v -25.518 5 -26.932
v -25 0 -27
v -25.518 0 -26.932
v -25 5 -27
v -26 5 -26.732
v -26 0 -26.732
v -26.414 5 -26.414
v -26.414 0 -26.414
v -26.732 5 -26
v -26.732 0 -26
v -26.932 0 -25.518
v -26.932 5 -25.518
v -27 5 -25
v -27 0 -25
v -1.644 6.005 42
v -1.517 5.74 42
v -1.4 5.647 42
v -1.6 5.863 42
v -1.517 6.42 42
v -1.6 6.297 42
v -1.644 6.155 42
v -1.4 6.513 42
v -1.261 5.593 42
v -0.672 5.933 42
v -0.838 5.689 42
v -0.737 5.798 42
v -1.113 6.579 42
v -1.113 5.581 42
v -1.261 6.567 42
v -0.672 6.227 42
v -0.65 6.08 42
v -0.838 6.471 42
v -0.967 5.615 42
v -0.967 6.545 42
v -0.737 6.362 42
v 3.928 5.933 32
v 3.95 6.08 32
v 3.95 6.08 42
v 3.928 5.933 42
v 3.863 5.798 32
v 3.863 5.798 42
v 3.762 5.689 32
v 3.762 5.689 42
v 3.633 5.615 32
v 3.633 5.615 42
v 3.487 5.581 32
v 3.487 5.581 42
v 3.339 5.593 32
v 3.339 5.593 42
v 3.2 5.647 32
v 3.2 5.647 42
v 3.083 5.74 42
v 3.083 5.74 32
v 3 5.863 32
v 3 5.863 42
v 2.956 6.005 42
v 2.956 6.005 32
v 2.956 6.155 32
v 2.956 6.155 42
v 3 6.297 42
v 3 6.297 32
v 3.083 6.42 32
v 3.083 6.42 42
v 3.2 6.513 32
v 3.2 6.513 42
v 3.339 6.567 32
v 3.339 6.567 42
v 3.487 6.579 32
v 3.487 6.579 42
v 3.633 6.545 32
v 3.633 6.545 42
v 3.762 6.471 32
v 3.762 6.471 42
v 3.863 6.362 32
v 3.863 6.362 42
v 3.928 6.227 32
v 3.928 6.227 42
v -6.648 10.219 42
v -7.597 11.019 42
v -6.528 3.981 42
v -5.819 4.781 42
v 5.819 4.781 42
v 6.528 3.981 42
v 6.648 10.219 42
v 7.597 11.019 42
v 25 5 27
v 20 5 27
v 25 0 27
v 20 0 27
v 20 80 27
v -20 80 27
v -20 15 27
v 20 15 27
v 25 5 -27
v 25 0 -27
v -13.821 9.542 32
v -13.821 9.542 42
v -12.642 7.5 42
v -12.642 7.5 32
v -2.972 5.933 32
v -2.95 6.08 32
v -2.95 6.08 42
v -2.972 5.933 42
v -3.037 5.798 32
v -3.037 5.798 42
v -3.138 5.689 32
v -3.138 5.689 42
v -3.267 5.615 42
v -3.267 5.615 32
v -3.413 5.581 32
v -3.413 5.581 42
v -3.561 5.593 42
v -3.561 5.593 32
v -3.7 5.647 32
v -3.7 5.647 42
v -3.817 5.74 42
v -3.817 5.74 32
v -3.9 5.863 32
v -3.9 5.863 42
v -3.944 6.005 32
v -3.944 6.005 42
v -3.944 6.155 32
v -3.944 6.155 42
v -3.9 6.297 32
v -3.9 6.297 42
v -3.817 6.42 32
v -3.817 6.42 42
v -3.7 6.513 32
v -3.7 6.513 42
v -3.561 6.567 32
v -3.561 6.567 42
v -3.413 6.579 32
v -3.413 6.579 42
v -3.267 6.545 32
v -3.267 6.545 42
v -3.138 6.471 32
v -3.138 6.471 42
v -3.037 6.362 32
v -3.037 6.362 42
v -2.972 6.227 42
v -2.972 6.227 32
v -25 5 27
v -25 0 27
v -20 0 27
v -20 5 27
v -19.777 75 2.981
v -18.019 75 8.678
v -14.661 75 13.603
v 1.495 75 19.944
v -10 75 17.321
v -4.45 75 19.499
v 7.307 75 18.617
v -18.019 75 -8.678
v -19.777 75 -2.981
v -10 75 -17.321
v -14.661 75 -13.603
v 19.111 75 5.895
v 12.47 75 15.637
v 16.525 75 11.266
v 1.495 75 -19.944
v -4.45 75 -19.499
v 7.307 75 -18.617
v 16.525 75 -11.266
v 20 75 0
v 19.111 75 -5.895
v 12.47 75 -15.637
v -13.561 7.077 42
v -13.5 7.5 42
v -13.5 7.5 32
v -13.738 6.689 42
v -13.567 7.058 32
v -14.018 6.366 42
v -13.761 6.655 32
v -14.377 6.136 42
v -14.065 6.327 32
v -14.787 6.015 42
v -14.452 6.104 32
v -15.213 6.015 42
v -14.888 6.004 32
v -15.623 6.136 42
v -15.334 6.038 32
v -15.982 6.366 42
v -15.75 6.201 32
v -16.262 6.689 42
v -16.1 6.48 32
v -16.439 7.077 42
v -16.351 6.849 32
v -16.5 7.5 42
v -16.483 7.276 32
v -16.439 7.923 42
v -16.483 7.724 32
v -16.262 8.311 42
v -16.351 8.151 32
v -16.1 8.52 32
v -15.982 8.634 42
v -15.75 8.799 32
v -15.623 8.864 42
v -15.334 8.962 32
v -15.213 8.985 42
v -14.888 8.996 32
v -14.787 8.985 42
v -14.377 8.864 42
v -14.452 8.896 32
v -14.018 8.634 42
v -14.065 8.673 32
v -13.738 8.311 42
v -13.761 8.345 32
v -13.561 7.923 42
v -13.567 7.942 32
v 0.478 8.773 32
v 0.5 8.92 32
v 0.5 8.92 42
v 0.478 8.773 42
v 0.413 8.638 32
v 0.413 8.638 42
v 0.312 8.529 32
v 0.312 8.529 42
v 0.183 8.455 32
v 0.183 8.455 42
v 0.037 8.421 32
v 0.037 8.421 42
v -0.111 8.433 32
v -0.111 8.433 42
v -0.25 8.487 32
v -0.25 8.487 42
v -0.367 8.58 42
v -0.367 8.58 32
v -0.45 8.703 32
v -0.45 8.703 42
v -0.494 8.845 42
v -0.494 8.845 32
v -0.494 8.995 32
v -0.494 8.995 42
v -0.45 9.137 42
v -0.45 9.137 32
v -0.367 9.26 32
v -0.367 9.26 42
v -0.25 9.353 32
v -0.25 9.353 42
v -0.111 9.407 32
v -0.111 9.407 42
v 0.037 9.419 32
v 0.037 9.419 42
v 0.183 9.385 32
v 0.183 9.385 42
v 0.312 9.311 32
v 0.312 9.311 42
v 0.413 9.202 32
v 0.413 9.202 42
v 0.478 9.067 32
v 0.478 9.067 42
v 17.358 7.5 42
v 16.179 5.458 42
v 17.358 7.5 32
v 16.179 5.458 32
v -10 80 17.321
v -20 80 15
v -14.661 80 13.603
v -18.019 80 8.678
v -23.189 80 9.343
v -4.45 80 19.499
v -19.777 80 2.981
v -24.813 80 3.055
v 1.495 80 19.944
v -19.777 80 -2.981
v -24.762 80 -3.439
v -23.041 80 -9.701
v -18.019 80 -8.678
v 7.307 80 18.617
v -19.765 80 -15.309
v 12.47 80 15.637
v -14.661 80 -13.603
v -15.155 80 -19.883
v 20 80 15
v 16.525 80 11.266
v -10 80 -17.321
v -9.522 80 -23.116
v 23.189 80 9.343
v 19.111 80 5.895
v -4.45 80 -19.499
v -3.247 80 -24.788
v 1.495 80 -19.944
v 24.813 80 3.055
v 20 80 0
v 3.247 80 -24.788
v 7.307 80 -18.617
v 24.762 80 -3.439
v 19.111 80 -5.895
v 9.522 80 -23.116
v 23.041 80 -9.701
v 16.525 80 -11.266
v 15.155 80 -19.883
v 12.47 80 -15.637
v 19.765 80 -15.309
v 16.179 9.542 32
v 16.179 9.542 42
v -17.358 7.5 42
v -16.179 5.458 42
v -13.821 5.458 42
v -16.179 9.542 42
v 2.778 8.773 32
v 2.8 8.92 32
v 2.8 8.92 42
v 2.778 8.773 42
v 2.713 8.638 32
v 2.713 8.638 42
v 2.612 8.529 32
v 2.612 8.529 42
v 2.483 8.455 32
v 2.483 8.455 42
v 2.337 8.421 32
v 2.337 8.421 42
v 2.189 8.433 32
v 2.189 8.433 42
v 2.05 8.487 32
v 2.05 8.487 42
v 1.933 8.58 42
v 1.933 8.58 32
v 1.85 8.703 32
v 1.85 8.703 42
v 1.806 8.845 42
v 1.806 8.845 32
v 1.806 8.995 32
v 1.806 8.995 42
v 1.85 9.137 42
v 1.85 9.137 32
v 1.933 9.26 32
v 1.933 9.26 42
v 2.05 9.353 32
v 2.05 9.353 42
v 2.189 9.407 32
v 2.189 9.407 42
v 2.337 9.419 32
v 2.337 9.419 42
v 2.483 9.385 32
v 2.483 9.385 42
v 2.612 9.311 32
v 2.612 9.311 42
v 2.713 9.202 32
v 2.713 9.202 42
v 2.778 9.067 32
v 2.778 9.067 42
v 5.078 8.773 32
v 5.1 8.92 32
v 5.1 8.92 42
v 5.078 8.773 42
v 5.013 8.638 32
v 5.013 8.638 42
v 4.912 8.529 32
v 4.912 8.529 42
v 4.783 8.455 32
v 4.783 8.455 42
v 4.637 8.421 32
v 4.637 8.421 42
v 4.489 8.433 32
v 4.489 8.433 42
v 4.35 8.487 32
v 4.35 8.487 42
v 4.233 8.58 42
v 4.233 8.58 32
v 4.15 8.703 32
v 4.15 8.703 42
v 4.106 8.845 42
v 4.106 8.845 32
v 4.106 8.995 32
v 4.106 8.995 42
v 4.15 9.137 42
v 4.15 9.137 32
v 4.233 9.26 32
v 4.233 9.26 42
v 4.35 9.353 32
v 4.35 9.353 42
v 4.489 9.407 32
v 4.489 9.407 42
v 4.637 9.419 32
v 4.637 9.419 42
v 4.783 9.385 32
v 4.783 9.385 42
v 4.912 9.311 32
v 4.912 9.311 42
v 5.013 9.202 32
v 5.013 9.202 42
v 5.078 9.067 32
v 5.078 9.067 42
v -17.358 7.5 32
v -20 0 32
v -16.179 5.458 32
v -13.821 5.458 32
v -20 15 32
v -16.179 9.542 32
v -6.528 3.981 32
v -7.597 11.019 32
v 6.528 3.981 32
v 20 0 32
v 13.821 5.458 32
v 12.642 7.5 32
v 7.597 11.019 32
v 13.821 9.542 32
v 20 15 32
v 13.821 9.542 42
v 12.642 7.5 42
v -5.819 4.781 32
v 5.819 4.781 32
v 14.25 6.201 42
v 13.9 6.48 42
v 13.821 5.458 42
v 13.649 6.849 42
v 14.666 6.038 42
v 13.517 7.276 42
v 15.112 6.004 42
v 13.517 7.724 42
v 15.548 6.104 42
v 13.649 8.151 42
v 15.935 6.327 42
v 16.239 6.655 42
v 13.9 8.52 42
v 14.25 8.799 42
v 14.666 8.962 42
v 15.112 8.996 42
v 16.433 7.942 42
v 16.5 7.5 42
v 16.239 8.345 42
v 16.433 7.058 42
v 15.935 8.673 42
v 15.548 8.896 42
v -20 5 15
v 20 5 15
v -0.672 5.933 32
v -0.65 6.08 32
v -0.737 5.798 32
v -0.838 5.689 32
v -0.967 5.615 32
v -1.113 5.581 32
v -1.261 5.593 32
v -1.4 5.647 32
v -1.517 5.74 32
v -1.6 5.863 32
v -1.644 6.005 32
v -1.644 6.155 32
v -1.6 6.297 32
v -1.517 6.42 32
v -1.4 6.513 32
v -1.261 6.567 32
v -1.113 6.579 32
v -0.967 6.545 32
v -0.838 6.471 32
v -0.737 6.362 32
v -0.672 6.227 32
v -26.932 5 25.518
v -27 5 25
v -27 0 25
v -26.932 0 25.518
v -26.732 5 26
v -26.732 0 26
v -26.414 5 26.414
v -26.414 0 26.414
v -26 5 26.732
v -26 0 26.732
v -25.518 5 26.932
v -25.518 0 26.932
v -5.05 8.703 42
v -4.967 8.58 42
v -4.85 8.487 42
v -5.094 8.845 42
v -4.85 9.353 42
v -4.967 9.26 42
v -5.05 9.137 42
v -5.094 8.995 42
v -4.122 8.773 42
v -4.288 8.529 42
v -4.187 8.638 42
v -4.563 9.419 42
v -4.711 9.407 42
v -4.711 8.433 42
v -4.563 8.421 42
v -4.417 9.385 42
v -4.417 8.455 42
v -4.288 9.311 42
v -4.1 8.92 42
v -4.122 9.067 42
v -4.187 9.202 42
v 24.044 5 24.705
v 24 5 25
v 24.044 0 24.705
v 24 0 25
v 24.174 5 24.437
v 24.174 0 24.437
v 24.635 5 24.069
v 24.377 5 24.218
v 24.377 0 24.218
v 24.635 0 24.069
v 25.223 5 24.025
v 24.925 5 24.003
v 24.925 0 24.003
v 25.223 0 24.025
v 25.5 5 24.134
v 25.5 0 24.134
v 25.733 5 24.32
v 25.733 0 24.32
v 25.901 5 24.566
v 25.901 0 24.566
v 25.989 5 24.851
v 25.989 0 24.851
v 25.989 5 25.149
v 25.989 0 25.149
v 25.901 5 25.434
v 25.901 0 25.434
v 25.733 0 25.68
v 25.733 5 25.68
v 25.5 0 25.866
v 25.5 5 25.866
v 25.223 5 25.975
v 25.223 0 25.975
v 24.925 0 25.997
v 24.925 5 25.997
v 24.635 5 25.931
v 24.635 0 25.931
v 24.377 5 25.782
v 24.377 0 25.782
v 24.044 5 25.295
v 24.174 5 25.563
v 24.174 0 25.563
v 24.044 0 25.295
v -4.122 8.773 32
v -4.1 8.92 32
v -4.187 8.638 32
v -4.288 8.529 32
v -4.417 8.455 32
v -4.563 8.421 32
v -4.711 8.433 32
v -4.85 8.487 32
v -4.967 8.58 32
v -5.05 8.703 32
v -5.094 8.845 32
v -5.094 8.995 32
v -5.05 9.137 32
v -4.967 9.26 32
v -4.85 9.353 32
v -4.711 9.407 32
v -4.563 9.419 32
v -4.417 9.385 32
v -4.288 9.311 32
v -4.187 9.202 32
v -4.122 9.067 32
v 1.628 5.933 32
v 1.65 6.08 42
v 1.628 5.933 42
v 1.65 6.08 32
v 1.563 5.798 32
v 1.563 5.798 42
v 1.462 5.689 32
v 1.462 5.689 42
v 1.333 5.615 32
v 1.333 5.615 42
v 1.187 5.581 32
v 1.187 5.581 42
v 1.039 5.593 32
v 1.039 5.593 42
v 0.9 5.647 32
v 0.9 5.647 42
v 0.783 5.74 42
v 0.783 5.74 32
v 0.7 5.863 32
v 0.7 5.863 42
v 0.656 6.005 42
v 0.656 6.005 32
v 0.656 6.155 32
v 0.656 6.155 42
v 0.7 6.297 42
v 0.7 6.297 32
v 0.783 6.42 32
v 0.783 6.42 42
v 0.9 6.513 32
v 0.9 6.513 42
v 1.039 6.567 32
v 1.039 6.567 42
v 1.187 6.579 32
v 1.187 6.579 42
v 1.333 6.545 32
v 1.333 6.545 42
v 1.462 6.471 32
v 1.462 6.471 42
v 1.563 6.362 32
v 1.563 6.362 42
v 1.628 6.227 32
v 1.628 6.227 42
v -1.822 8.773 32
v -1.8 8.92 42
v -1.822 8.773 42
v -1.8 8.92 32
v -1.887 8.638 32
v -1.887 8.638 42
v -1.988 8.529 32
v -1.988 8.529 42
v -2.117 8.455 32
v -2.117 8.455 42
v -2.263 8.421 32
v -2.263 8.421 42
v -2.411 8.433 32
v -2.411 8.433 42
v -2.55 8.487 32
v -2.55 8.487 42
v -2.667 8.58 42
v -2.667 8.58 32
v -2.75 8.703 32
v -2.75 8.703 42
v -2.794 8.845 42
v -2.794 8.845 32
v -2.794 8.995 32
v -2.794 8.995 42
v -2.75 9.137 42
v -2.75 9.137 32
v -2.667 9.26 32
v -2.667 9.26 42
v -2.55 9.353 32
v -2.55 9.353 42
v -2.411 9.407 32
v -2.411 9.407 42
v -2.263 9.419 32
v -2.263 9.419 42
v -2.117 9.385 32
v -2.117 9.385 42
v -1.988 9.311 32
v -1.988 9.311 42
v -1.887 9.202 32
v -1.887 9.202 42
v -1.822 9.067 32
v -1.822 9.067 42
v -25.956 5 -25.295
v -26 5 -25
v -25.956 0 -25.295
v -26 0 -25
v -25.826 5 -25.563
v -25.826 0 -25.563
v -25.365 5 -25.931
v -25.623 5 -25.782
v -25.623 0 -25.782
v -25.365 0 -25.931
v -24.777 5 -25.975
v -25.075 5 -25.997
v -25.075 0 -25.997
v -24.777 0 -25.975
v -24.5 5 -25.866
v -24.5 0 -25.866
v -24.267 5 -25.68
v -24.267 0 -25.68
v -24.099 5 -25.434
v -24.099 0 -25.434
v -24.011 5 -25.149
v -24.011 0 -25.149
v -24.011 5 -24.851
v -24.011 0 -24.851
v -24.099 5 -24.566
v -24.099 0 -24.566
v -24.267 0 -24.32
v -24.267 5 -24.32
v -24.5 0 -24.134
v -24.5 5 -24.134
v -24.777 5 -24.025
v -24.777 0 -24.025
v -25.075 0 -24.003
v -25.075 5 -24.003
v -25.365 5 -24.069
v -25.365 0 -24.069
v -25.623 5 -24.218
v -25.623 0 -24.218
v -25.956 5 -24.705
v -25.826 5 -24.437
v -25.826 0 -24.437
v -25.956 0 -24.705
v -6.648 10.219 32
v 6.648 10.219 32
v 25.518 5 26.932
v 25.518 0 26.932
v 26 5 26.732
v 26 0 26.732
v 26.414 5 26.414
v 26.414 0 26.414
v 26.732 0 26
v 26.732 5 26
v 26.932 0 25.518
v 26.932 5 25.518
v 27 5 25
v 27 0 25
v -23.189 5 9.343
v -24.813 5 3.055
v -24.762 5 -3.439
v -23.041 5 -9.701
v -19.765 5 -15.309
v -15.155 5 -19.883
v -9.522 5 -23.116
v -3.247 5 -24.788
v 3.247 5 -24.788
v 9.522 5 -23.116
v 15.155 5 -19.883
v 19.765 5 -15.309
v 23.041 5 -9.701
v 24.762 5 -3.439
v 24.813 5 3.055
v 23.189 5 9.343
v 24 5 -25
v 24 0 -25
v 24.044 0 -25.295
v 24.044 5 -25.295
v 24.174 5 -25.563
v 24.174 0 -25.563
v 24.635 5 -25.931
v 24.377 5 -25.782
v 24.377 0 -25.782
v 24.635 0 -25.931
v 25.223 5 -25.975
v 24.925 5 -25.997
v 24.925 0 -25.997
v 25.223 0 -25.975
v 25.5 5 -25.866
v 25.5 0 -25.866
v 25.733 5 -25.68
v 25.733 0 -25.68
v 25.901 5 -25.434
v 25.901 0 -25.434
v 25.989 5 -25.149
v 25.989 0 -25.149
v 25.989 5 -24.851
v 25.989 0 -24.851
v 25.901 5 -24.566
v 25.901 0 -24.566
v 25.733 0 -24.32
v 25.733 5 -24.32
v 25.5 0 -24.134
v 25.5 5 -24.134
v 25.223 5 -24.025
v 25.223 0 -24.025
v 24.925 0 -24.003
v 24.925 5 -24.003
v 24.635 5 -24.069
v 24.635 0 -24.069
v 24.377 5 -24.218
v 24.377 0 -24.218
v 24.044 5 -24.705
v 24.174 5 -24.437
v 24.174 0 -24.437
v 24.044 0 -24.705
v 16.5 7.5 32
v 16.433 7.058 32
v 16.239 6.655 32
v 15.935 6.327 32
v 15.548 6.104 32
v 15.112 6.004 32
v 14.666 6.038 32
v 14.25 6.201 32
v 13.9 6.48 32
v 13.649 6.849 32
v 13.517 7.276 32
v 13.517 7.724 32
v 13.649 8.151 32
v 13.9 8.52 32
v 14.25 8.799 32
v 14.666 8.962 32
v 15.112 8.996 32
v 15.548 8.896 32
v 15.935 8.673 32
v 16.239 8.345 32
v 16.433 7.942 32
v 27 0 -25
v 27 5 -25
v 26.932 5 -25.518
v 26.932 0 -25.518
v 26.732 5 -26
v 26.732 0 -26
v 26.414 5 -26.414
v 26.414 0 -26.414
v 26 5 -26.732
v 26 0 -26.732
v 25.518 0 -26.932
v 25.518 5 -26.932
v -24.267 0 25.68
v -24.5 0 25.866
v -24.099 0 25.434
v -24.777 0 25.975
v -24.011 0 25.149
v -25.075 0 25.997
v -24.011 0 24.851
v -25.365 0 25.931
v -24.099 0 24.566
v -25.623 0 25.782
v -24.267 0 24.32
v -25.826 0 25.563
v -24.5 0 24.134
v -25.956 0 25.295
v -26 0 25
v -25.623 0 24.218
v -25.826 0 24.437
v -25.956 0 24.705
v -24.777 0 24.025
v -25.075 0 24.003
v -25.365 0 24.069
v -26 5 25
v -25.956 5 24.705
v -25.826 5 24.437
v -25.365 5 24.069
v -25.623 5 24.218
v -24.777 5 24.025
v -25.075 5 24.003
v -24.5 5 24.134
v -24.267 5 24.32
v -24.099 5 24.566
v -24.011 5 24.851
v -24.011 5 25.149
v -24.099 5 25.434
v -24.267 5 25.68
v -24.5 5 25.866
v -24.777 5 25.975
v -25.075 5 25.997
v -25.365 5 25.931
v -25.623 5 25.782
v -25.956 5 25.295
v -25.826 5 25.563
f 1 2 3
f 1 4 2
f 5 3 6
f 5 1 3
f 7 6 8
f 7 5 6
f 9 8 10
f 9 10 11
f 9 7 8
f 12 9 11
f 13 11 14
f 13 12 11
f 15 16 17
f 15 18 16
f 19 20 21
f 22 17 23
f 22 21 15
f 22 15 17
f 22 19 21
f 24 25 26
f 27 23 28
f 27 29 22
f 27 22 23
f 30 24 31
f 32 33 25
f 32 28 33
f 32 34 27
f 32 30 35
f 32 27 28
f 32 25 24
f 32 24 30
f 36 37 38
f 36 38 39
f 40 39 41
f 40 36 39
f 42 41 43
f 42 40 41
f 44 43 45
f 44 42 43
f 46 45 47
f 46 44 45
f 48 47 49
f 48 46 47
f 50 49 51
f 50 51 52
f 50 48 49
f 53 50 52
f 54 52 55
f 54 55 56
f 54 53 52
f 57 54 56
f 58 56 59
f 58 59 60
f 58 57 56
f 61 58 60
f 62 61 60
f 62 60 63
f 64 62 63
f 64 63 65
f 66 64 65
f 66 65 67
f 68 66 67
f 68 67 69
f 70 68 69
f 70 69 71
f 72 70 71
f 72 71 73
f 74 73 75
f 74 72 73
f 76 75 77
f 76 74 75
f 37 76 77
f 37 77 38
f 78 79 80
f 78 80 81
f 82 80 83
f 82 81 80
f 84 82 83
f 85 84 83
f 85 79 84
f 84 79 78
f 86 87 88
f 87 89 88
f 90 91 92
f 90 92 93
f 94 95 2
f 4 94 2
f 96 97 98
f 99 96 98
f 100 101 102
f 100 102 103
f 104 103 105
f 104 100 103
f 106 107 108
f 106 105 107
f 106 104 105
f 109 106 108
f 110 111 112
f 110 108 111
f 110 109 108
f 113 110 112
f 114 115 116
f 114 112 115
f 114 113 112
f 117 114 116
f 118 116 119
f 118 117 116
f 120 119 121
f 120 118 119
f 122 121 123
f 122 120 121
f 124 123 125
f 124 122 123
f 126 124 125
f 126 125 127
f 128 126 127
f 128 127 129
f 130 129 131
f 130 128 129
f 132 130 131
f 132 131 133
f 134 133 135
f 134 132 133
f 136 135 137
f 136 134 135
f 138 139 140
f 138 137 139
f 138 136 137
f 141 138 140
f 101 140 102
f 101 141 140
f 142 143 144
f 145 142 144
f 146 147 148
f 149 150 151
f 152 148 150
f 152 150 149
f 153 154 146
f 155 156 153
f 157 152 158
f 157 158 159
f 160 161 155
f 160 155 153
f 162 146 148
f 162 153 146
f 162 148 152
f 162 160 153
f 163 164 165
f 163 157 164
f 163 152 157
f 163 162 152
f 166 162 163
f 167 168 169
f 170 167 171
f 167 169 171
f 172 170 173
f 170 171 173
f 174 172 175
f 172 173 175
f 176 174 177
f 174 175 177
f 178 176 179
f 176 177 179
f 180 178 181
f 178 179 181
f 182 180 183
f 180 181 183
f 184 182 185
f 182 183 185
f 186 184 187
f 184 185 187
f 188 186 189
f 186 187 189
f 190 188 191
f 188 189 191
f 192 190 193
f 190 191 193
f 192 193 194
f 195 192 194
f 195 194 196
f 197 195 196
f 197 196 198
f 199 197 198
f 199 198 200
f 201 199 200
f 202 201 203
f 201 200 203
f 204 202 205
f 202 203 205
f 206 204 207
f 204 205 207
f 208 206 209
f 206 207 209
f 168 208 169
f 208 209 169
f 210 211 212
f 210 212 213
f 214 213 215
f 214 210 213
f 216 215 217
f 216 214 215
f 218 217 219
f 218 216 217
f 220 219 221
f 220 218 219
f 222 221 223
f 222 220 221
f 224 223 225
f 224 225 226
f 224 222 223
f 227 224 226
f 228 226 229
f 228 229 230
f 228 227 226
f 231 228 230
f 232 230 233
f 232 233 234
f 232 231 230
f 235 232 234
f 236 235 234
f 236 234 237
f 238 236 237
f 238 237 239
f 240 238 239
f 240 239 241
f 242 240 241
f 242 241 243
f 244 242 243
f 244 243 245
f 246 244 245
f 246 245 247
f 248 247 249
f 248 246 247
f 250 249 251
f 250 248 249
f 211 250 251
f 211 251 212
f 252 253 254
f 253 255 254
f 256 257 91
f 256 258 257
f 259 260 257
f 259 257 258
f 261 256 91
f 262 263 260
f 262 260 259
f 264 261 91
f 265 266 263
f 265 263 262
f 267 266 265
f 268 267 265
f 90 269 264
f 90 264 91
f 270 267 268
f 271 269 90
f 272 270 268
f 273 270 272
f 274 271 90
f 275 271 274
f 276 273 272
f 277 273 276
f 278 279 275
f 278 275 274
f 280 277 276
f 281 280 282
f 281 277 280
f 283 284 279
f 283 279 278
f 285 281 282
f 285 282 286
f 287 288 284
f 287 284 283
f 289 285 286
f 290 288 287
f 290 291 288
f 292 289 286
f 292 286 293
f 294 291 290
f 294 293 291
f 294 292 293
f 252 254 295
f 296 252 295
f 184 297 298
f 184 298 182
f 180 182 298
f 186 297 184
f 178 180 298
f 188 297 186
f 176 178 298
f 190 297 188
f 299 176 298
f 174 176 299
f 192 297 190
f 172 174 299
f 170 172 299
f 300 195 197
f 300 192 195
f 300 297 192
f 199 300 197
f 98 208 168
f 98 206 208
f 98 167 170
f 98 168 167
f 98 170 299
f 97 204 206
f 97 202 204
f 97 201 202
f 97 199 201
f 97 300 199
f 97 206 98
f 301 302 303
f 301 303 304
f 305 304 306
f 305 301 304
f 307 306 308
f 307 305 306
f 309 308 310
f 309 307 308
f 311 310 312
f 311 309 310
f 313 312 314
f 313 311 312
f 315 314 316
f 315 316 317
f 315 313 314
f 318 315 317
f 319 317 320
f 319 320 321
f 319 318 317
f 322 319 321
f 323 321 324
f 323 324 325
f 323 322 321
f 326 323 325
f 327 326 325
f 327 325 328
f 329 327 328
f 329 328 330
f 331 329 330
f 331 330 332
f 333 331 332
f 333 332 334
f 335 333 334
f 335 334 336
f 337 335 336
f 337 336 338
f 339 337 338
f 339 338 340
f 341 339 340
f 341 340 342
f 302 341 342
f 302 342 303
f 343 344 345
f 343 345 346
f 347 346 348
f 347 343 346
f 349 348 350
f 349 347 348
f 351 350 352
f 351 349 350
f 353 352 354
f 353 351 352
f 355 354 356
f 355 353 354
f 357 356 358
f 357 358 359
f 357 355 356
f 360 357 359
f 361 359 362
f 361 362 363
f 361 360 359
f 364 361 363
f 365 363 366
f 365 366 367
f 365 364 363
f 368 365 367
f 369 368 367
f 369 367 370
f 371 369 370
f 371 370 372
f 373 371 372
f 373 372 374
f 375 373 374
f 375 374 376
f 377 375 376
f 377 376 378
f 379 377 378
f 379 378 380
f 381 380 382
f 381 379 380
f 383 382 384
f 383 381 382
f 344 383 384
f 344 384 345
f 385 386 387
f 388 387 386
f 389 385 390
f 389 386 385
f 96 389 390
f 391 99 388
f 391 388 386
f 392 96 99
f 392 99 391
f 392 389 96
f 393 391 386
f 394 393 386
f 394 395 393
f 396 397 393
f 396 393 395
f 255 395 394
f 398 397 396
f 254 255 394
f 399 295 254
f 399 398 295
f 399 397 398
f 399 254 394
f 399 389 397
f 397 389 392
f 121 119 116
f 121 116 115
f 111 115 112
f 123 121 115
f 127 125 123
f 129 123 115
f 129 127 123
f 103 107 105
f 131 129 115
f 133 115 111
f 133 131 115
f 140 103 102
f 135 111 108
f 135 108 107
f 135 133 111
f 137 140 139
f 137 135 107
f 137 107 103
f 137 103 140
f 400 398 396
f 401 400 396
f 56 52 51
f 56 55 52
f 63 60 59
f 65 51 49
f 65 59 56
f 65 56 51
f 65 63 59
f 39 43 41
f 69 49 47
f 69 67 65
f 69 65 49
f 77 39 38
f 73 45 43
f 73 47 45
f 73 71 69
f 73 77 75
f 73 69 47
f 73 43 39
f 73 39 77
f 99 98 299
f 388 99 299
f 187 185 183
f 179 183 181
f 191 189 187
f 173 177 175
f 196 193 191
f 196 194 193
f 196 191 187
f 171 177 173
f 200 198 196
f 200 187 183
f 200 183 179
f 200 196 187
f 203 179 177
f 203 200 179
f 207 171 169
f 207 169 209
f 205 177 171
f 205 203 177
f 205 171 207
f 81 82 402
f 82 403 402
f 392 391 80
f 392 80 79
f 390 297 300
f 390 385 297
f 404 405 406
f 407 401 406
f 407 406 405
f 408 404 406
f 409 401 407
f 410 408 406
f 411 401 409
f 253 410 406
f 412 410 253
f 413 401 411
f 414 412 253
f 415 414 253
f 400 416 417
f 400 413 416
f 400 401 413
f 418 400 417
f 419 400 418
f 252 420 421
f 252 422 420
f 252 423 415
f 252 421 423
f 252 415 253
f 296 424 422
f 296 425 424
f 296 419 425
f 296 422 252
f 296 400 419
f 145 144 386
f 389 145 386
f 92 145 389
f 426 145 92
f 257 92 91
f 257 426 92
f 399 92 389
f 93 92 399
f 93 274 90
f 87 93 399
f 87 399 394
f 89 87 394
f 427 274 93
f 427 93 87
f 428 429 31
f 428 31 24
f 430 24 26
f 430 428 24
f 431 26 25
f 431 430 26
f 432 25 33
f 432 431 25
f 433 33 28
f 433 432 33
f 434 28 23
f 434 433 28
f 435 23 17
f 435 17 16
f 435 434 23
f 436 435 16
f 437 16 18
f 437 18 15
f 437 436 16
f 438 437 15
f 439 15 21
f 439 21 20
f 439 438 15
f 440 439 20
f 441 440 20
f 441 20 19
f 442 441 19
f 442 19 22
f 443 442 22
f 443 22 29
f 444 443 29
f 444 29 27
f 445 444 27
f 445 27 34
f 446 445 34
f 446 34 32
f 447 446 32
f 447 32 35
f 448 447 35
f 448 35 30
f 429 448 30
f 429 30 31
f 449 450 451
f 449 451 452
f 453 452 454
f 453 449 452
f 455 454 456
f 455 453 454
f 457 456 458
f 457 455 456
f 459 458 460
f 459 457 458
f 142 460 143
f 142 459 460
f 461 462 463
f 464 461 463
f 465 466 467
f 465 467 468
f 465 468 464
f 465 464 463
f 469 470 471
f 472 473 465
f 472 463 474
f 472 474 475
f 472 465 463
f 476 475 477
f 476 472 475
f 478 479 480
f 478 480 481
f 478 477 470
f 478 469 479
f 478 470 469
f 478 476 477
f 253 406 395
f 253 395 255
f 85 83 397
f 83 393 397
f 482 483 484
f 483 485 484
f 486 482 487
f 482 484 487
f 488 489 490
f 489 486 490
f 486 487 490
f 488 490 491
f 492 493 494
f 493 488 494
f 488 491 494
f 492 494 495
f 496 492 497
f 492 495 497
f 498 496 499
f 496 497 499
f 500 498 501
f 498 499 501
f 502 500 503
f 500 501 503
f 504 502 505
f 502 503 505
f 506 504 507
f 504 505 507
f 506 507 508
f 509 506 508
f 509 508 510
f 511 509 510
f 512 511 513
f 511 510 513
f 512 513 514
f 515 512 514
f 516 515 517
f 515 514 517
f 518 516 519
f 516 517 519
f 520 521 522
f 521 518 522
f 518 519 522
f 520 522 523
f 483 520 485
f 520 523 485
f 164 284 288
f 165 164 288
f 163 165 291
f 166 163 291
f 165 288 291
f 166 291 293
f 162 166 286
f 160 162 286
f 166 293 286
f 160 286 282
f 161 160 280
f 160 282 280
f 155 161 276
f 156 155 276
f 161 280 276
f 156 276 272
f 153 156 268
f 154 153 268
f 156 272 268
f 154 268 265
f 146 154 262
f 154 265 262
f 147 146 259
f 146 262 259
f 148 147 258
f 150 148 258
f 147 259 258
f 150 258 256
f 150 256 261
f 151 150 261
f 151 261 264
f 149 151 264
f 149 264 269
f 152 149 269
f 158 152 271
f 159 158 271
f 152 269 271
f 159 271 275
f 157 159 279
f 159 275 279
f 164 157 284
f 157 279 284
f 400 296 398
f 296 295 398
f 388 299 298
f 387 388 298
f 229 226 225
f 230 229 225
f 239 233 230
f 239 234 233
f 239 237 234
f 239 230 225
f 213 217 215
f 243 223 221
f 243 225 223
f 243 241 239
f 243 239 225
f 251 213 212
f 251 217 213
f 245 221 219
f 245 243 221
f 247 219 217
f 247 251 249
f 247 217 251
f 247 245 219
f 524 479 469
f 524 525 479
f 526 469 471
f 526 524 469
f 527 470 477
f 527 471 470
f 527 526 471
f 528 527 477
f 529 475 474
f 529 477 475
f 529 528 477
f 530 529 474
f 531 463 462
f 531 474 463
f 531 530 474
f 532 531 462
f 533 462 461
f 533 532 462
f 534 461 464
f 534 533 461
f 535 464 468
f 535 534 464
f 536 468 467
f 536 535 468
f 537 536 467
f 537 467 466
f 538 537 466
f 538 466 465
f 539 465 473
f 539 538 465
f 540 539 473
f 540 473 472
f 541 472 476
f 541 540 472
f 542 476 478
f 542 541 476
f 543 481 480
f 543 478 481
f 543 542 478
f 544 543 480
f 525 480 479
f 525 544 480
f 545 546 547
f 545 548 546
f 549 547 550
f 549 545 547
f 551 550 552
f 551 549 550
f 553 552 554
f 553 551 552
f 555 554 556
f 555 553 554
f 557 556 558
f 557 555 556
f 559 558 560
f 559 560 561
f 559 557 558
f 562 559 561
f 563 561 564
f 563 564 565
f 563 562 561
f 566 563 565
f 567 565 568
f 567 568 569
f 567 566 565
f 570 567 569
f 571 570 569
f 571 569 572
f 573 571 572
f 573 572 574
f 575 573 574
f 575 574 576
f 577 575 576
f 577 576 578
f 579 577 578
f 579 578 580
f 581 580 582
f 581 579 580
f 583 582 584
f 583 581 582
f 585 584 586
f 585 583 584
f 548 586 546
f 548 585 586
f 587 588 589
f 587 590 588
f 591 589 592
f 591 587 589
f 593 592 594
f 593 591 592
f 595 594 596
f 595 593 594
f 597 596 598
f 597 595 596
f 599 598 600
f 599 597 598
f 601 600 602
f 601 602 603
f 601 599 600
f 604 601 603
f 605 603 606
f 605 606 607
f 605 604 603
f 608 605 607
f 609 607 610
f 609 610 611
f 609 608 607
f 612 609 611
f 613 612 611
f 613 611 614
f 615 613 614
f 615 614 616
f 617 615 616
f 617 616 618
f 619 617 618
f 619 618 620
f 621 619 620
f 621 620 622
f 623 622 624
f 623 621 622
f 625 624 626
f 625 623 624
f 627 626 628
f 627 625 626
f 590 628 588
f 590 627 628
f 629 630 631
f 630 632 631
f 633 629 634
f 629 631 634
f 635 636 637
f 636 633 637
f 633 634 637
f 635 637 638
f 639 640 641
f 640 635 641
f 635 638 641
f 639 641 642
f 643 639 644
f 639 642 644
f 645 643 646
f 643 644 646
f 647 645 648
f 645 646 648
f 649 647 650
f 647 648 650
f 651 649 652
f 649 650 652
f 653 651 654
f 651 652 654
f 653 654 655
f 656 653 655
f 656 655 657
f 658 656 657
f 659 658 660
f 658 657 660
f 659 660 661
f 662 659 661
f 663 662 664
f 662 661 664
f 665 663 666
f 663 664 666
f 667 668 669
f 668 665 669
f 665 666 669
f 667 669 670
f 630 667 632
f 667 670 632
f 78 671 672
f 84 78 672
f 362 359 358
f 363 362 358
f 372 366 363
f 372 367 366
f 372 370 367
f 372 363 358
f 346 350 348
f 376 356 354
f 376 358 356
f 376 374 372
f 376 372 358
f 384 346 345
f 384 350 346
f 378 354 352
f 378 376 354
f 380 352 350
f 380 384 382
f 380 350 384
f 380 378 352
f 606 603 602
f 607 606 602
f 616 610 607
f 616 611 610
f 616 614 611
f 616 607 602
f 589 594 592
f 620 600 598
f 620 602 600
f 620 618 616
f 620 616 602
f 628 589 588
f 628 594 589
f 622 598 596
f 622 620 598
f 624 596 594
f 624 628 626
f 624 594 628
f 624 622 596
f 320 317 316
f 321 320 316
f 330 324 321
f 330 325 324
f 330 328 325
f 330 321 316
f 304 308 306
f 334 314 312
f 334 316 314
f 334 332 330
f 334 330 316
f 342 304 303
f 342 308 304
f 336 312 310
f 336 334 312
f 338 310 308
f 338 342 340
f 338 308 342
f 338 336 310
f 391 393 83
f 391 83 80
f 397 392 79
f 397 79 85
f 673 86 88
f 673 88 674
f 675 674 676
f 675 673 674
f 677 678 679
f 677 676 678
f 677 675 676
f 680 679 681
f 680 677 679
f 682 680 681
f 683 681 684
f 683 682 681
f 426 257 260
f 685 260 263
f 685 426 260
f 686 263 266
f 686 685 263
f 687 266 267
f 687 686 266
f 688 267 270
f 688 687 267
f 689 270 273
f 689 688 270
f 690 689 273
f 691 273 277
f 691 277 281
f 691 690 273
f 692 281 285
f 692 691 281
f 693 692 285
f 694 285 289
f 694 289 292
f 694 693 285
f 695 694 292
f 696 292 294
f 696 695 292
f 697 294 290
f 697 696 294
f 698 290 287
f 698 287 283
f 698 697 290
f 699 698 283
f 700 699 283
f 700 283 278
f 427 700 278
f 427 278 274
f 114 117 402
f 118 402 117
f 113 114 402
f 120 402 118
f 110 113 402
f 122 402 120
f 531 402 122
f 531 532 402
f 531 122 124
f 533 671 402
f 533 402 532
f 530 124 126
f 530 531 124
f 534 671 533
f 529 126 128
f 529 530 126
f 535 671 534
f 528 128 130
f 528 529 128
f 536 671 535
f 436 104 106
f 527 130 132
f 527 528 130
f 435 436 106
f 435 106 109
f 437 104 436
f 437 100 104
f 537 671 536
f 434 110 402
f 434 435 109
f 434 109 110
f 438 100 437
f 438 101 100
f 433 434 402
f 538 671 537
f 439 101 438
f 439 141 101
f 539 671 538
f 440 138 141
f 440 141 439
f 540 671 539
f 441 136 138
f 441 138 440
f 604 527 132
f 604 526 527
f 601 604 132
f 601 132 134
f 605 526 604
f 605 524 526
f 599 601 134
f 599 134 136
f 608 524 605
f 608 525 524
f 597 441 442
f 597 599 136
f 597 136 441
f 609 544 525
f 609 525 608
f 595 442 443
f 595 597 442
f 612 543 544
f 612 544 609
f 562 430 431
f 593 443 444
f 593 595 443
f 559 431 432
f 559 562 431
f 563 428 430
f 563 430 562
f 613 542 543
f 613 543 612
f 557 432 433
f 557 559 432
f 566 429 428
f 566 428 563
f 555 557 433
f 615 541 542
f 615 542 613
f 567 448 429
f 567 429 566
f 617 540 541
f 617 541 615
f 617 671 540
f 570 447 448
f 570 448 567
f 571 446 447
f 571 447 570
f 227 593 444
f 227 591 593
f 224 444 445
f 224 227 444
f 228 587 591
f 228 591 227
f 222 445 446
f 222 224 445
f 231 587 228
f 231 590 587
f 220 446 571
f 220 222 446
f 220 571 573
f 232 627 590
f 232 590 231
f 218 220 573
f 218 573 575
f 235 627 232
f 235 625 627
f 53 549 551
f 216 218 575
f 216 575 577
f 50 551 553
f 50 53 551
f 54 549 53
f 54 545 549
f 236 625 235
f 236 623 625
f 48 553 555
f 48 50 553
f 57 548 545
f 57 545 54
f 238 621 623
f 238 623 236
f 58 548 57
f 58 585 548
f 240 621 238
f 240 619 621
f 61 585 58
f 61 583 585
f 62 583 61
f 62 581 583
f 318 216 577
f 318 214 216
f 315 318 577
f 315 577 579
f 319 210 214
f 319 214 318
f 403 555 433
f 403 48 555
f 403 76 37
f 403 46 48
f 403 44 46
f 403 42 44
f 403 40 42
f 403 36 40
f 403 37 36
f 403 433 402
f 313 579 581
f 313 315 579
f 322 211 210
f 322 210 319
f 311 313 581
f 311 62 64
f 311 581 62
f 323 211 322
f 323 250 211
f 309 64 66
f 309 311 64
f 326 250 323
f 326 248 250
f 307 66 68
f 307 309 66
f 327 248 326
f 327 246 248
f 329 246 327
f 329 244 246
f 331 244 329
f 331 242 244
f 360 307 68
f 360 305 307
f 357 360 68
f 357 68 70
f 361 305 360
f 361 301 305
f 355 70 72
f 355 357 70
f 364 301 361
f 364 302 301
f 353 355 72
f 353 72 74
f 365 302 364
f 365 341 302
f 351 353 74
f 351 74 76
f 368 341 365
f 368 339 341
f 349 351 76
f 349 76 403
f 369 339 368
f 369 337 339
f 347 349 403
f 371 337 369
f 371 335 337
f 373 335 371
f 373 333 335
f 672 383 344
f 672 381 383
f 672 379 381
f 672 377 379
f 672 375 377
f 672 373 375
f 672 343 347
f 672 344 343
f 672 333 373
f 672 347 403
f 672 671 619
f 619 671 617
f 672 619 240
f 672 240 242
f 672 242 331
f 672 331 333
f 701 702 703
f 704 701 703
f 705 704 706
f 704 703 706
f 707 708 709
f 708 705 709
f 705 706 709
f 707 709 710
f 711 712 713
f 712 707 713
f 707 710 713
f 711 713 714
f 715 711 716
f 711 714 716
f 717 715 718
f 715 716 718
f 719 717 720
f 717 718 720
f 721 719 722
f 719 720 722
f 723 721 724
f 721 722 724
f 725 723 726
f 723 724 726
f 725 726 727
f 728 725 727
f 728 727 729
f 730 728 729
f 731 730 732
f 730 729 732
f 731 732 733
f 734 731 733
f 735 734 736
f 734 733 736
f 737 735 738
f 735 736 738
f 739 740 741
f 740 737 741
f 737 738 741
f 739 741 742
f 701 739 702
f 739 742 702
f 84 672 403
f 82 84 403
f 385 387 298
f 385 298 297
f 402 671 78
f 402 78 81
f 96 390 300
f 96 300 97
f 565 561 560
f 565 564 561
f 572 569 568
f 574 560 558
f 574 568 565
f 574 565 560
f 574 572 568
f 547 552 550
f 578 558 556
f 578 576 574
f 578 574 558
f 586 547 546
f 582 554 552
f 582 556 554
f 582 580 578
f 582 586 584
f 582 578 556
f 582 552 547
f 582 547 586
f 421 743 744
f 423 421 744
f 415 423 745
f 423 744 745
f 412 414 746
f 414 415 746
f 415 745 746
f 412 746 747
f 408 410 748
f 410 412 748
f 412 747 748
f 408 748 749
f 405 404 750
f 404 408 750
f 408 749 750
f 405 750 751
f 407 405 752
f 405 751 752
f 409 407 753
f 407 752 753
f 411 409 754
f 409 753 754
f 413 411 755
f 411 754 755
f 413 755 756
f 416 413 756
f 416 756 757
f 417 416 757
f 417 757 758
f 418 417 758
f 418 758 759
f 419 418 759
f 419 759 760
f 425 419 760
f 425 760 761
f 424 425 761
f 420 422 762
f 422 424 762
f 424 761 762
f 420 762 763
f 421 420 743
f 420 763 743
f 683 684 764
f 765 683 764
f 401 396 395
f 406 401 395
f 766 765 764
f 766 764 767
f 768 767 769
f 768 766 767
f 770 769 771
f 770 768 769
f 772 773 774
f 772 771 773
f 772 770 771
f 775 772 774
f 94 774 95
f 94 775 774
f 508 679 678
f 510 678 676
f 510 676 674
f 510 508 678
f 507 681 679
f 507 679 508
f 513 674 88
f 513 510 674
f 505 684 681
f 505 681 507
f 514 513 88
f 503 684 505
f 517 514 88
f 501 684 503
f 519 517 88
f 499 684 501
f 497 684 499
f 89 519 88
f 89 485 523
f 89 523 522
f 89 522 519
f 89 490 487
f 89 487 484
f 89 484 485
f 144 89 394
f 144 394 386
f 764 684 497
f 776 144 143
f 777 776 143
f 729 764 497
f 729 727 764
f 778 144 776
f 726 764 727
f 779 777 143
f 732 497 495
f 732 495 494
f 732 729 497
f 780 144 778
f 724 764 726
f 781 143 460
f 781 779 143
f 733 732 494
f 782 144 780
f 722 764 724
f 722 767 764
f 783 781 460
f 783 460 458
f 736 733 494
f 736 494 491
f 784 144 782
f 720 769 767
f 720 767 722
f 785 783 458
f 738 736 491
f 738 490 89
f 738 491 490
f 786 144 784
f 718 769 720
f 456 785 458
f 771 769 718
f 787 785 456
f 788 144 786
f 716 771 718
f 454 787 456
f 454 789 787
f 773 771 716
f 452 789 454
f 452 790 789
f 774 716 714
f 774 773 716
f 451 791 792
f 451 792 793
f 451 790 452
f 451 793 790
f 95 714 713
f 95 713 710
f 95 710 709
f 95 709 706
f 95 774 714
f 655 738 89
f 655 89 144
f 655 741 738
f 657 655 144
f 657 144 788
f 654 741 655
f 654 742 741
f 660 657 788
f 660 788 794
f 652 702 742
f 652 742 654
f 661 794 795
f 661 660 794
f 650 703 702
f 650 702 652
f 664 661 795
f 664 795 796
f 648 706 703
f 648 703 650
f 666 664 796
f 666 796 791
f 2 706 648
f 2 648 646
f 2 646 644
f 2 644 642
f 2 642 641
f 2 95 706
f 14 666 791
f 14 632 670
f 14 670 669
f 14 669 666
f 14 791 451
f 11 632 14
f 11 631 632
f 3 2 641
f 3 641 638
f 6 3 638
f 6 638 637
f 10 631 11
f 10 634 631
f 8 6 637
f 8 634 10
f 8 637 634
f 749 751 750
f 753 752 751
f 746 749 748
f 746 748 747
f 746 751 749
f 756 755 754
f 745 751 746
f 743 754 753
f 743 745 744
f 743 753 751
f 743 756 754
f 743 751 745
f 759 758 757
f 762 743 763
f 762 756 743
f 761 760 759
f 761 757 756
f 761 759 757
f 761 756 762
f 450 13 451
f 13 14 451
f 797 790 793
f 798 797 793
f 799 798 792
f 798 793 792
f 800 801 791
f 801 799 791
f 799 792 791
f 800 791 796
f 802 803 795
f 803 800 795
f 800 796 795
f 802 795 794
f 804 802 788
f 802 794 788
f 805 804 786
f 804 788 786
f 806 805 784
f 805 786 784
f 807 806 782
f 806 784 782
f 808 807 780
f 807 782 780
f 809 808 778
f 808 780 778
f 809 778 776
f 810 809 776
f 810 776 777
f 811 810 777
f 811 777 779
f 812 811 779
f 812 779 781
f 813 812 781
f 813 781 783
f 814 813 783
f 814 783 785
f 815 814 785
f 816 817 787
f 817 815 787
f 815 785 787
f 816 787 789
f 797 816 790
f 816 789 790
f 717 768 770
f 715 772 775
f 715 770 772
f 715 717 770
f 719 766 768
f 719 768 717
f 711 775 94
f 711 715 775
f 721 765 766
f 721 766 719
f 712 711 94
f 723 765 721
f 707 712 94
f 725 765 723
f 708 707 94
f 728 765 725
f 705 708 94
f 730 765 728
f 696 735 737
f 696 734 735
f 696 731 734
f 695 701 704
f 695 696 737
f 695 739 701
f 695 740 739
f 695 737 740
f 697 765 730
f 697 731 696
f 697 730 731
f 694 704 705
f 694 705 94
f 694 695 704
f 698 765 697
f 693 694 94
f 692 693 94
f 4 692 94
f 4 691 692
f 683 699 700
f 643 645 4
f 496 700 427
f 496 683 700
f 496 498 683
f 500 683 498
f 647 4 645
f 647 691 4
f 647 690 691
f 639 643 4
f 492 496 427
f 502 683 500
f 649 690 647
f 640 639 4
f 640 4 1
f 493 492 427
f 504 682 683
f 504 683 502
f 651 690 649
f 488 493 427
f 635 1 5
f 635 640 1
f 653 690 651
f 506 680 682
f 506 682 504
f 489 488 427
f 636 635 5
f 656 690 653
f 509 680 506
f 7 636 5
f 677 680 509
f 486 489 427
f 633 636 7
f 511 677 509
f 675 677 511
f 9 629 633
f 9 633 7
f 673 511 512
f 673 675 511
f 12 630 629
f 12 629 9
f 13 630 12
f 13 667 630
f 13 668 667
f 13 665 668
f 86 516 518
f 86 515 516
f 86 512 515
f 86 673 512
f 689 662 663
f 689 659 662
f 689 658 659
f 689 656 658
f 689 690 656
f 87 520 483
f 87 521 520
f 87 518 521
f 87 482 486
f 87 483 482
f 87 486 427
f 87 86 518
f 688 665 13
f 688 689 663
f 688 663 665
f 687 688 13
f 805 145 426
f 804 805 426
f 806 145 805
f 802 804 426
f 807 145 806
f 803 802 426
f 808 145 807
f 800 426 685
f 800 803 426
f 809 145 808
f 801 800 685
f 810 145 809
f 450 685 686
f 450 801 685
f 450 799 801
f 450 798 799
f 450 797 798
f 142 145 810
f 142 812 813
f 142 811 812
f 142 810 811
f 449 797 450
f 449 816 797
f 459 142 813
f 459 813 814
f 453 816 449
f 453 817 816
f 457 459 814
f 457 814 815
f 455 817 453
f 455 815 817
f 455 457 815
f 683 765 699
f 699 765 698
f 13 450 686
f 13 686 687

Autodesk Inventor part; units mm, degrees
sketch "Sketch1" plane through (0, 0, 0) normal (0, 1, 0) x (-1, 0, 0)
  line L0 (27, 27) -> (-27, 27)
  line L1 (-27, 27) -> (-27, -27)
  line L2 (-27, -27) -> (27, -27)
  line L3 (27, -27) -> (27, 27)
  line L4 (27, 27) -> (-27, -27) construction
  line L5 (-27, 27) -> (27, -27) construction
  circle A0 centre (25, 25) radius 1
  circle A1 centre (25, -25) radius 1
  circle A2 centre (-25, -25) radius 1
  circle A3 centre (-25, 25) radius 1
  point P0 (0, 0)
  dimension "d0" = 54
  dimension "d1" = 54
  dimension "d2" = 2
  dimension "d3" = 2
  dimension "d4" = 2
  dimension "d5" = 2
extrude "Extrusion1" add sketch "Sketch1" along normal blind 5
fillet "Fillet1" radius 2 1 edges at (27, 2.5, -27)
fillet "Fillet2" radius 2 3 edges at (-27, 2.5, -27) (-27, 2.5, 27) (27, 2.5, 27)
ref_plane "Work Plane1" through (0, 5, 0) normal (0, 1, 0) x (1, 0, 0)
sketch "Sketch3" plane through (0, 5, 0) normal (0, 1, 0) x (1, 0, 0)
  circle A0 centre (0, 0) radius 25
  line L0 (-25, -27) -> (25, -27) projected
  line L1 (0, -27) -> (20, -27)
  line L2 (20, -27) -> (20, -15)
  line L3 (0, -27) -> (-20, -27)
  line L4 (-20, -27) -> (-20, -15)
  dimension "d11" = 50
  dimension "d12" = 20
  dimension "d13" = 20
extrude "Extrusion2" add sketch "Sketch3" along normal blind 75
ref_plane "Work Plane2" through (0, 80, 0) normal (0, 1, 0) x (1, 0, 0)
sketch "Sketch4" plane through (0, 80, 0) normal (0, 1, 0) x (1, 0, 0)
  circle A0 centre (0, 0) radius 20
  dimension "d17" = 40
extrude "Extrusion3" cut sketch "Sketch4" against normal blind 5
ref_plane "Work Plane3" through (-25, 0, 27) normal (0, 0, 1) x (1, 0, 0)
sketch "Sketch5" plane through (-25, 0, 27) normal (0, 0, 1) x (1, 0, 0)
  line L0 (25, 0) -> (25, 7.5)
  line L1 (5, 15) -> (45, 15)
  line L2 (45, 15) -> (45, 0)
  line L3 (45, 0) -> (5, 0)
  line L4 (5, 0) -> (5, 15)
  line L5 (5, 15) -> (45, 0) construction
  line L6 (45, 15) -> (5, 0) construction
  dimension "d21" = 7.5
  dimension "d22" = 40
  dimension "d23" = 15
extrude "Extrusion4" add sketch "Sketch5" along normal blind 5
ref_plane "Work Plane4" through (-25, 0, 32) normal (0, 0, 1) x (1, 0, 0)
sketch "Sketch6" plane through (-25, 0, 32) normal (0, 0, 1) x (1, 0, 0)
  line L0 (25, 7.5) -> (25, 8.92)
  circle A0 centre (25, 8.92) radius 0.5
  line L1 (25, 8.92) -> (27.3, 8.92)
  line L2 (27.3, 8.92) -> (29.6, 8.92)
  line L3 (25, 8.92) -> (22.7, 8.92)
  line L4 (22.7, 8.92) -> (20.4, 8.92)
  circle A1 centre (20.4, 8.92) radius 0.5
  circle A2 centre (27.3, 8.92) radius 0.5
  circle A3 centre (22.7, 8.92) radius 0.5
  circle A4 centre (29.6, 8.92) radius 0.5
  line L5 (25, 7.5) -> (25, 6.08)
  line L6 (26.15, 6.08) -> (25, 6.08)
  line L7 (23.85, 6.08) -> (25, 6.08)
  circle A5 centre (26.15, 6.08) radius 0.5
  circle A6 centre (23.85, 6.08) radius 0.5
  line L8 (23.85, 6.08) -> (21.55, 6.08)
  line L9 (26.15, 6.08) -> (28.45, 6.08)
  circle A7 centre (28.45, 6.08) radius 0.5
  circle A8 centre (21.55, 6.08) radius 0.5
  line L10 (18.3522, 10.2186) -> (31.6478, 10.2186)
  line L11 (30.8187, 4.7814) -> (19.1813, 4.7814)
  line L12 (31.6478, 10.2186) -> (30.8187, 4.7814)
  line L13 (18.3522, 10.2186) -> (19.1813, 4.7814)
  line L14 (25, 10.2186) -> (25, 11.0186)
  line L15 (25, 4.7814) -> (25, 3.9814)
  line L16 (25, 3.9814) -> (31.5285, 3.9814)
  line L17 (31.5285, 3.9814) -> (32.5973, 11.0186)
  line L18 (32.5973, 11.0186) -> (25, 11.0186)
  line L19 (25, 3.9814) -> (18.4715, 3.9814)
  line L20 (18.4715, 3.9814) -> (17.4027, 11.0186)
  line L21 (17.4027, 11.0186) -> (25, 11.0186)
  point P0 (25, 0)
  dimension "d30" = 1
  dimension "d33" = 1
  dimension "d34" = 1
  dimension "d35" = 1
  dimension "d36" = 1
  dimension "d38" = 1
  dimension "d39" = 1
  dimension "d40" = 1
  dimension "d41" = 1
  dimension "d44" = 0.8
extrude "Extrusion5" add sketch "Sketch6" along normal blind 10 contours A1 | A3 L4 L3 | L3 L4 A3 | A4 | A2 L2 L1 | L1 L2 A2 | A0 L3 L0 | L0 L1 A0 | A7 | A5 L9 L6 | L6 L9 A5 | A8 | A6 L8 L7 | L7 L8 A6 | L3 A0 L1 | L13 L11 L15 L19 L20 L21 L14 L10 | L14 L18 L17 L16 L15 L11 L12 L10
sketch "Sketch7" plane through (-25, 0, 32) normal (0, 0, 1) x (1, 0, 0)
  line L0 (5, 15) -> (5, 0) projected
  line L1 (5, 7.5) -> (10, 7.5)
  circle A0 centre (10, 7.5) radius 1.5
  line L2 (12.3579, 7.5) -> (11.1789, 5.458)
  line L3 (11.1789, 5.458) -> (8.8211, 5.458)
  line L4 (8.8211, 5.458) -> (7.6421, 7.5)
  line L5 (7.6421, 7.5) -> (8.8211, 9.542)
  line L6 (8.8211, 9.542) -> (11.1789, 9.542)
  line L7 (11.1789, 9.542) -> (12.3579, 7.5)
  line L8 (25, 0) -> (25, 2.1902)
  circle A1 centre (40, 7.5) radius 1.5
  line L9 (37.6421, 7.5) -> (38.8211, 5.458)
  line L10 (38.8211, 5.458) -> (41.1789, 5.458)
  line L11 (41.1789, 5.458) -> (42.3579, 7.5)
  line L12 (42.3579, 7.5) -> (41.1789, 9.542)
  line L13 (41.1789, 9.542) -> (38.8211, 9.542)
  line L14 (38.8211, 9.542) -> (37.6421, 7.5)
  dimension "d48" = 5
  dimension "d49" = 3
extrude "Extrusion6" add sketch "Sketch7" along normal blind 10
properties part number "sensor 1"
